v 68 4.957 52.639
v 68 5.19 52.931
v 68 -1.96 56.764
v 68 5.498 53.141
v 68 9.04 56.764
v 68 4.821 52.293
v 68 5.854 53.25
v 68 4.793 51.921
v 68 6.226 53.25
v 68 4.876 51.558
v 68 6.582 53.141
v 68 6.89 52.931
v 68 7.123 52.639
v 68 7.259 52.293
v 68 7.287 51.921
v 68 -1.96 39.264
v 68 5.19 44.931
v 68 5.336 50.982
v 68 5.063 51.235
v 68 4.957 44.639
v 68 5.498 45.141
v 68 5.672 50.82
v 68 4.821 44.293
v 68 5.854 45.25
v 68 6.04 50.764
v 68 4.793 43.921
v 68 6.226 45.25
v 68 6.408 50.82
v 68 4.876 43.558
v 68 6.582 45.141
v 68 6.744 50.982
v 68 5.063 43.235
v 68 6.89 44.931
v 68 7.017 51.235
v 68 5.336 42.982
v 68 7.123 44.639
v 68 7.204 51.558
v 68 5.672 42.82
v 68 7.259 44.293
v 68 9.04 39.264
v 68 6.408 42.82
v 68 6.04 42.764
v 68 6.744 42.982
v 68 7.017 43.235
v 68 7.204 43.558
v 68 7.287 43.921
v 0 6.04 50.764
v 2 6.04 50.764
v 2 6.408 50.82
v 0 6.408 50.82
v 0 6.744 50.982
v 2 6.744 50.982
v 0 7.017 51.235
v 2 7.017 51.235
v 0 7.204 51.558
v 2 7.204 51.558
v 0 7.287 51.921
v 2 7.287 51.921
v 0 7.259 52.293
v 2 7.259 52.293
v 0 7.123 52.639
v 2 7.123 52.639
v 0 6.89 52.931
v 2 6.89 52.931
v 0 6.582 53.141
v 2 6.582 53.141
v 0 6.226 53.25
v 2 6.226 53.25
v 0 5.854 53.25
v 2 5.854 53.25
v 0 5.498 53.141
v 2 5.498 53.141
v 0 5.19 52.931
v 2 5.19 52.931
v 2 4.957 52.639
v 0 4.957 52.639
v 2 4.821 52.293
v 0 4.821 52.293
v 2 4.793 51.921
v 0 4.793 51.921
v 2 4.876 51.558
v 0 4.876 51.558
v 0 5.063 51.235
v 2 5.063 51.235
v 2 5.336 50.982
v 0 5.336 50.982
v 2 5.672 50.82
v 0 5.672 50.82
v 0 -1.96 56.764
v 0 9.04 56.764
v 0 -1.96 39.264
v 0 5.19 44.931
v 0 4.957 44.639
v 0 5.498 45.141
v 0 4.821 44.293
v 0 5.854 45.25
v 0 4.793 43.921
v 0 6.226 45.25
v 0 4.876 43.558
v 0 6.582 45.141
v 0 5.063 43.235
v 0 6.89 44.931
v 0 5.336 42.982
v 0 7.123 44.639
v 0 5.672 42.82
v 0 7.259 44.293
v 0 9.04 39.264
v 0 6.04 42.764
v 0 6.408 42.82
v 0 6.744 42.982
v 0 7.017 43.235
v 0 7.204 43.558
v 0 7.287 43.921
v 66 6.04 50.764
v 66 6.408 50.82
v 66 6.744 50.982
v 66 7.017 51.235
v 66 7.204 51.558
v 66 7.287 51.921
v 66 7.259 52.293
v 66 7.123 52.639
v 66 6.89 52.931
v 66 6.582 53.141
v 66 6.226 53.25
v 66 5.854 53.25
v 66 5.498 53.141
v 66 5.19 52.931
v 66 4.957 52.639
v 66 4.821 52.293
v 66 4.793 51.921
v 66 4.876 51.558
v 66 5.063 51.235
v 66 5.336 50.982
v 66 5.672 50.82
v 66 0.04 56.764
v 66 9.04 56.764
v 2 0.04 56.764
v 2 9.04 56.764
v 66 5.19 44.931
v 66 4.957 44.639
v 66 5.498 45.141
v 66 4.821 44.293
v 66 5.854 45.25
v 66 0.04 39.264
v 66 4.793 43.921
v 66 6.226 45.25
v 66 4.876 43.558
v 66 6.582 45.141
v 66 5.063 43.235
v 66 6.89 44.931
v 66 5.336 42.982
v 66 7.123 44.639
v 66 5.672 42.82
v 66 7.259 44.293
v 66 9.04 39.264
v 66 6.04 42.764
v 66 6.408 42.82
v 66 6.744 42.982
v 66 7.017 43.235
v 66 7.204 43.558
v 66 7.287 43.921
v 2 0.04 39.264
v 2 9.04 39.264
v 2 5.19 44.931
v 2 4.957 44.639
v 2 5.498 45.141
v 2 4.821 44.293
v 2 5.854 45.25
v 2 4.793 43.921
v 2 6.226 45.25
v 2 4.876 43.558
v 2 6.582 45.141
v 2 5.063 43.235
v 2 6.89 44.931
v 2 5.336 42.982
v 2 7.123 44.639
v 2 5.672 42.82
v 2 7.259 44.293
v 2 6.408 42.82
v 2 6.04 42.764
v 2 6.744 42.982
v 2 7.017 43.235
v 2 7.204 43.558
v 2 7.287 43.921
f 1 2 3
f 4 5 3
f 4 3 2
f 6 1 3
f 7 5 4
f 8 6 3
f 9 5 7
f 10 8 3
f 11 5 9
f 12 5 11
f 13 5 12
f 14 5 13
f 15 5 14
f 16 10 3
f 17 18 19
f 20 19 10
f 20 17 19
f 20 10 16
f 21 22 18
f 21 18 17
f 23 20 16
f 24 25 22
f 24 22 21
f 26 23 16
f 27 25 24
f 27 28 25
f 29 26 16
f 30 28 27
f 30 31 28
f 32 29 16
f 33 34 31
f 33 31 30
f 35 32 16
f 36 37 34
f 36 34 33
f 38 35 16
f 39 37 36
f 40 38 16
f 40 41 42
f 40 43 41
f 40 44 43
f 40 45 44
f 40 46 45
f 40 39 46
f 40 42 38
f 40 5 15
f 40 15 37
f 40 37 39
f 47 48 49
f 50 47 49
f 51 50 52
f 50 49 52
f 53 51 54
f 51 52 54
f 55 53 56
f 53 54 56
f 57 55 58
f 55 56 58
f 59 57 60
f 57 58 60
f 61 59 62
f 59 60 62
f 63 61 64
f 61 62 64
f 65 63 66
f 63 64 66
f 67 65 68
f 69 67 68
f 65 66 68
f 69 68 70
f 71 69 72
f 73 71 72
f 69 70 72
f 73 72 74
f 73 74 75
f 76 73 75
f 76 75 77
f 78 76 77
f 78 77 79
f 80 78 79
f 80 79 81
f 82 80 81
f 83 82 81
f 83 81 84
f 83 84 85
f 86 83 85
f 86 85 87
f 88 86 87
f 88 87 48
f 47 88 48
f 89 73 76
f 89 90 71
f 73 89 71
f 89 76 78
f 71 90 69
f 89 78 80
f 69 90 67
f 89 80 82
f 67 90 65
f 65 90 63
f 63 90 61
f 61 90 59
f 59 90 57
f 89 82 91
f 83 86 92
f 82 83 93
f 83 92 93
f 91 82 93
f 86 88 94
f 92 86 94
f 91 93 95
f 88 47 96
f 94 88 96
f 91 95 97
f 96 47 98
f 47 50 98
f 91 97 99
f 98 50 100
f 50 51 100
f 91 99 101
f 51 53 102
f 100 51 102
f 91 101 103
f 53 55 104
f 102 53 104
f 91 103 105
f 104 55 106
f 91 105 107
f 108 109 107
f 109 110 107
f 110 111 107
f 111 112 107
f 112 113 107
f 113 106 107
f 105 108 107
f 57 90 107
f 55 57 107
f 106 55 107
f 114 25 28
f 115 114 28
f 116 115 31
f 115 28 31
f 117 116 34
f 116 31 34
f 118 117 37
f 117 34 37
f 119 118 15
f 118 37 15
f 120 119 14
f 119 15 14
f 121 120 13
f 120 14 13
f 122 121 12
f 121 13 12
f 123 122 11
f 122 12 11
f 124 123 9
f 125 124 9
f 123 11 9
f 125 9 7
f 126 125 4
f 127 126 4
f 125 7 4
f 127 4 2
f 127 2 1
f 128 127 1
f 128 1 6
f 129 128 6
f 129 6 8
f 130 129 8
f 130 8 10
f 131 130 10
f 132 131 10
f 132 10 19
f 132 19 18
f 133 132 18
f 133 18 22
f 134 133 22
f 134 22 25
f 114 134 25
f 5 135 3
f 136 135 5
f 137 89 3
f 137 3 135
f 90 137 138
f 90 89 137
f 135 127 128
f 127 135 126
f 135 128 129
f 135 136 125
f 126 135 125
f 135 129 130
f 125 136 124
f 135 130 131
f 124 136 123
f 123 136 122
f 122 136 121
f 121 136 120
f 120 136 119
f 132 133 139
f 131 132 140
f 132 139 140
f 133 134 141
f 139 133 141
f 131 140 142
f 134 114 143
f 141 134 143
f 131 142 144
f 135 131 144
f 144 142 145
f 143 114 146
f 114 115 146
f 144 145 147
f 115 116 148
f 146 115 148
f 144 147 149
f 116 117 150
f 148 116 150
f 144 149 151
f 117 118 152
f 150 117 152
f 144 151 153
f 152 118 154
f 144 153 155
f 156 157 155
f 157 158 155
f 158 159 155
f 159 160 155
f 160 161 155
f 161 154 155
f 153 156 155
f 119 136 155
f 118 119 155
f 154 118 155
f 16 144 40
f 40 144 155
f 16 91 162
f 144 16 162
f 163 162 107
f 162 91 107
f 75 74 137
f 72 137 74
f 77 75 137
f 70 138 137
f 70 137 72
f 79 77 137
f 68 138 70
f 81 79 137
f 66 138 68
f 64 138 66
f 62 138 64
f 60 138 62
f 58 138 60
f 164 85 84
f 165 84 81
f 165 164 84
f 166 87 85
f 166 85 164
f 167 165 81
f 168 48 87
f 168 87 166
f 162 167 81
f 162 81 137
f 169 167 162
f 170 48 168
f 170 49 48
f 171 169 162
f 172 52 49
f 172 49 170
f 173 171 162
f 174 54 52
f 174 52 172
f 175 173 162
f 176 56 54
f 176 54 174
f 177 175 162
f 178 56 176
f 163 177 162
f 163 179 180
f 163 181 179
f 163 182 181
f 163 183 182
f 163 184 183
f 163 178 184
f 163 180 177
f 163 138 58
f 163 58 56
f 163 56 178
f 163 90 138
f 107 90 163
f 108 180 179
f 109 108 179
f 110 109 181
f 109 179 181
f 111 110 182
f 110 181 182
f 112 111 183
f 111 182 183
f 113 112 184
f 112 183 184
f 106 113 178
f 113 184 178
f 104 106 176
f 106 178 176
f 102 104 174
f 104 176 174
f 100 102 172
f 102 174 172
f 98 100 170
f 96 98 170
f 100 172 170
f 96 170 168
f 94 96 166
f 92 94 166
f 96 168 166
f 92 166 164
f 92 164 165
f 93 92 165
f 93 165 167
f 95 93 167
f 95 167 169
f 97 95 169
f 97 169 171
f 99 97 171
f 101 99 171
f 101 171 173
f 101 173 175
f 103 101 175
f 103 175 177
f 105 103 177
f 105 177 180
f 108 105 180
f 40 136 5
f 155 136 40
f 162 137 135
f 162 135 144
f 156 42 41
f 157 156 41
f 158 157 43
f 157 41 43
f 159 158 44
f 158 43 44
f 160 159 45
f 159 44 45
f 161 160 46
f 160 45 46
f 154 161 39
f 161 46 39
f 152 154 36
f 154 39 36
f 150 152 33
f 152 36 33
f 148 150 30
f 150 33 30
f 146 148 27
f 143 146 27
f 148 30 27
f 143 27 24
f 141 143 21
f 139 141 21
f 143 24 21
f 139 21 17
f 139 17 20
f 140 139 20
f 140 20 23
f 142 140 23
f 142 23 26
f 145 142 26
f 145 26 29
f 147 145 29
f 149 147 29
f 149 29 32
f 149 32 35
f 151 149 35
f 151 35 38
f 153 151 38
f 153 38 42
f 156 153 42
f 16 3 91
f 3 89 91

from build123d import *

# Parameters (mm, degrees)
SKETCH1_W           = 17.5
SKETCH1_H           = 11
BOSS_EXTRUDE1_DEPTH = 2
SKETCH2_W           = 17.5
SKETCH2_H           = 2
BOSS_EXTRUDE2_DEPTH = 64
SKETCH3_W           = 17.5
SKETCH3_H           = 11
BOSS_EXTRUDE3_DEPTH = 2
SKETCH4_R           = 1.25
CUT_EXTRUDE1_DEPTH  = 68


with BuildPart() as part:
    # Sketch1 → Boss-Extrude1 (new body)
    with BuildSketch(Plane(origin=(0, 0, 0), x_dir=(0, 0, -1), z_dir=(1, 0, 0))):
        with Locations((-48.014351082, 3.54)):
            Rectangle(SKETCH1_W, SKETCH1_H)
    extrude(amount=BOSS_EXTRUDE1_DEPTH)

    # Sketch2 → Boss-Extrude2 (add)
    with BuildSketch(Plane(origin=(2, 0, 0), x_dir=(0, 0, -1), z_dir=(1, 0, 0))):
        with Locations((-48.014351082, -0.96)):
            Rectangle(SKETCH2_W, SKETCH2_H)
    extrude(amount=BOSS_EXTRUDE2_DEPTH)

    # Sketch3 → Boss-Extrude3 (add)
    with BuildSketch(Plane(origin=(66, 0, 0), x_dir=(0, 0, -1), z_dir=(1, 0, 0))):
        with Locations((-48.014351082, 3.54)):
            Rectangle(SKETCH3_W, SKETCH3_H)
    extrude(amount=BOSS_EXTRUDE3_DEPTH)

    # Sketch4 → Cut-Extrude1 (cut)
    with BuildSketch(Plane(origin=(68, 0, 0), x_dir=(0, 0, -1), z_dir=(1, 0, 0))):
        with Locations((-52.014351082, 6.04)):
            Circle(SKETCH4_R)
        with Locations((-44.014351082, 6.04)):
            Circle(SKETCH4_R)
    extrude(amount=-CUT_EXTRUDE1_DEPTH, mode=Mode.SUBTRACT)


solid = part.part
